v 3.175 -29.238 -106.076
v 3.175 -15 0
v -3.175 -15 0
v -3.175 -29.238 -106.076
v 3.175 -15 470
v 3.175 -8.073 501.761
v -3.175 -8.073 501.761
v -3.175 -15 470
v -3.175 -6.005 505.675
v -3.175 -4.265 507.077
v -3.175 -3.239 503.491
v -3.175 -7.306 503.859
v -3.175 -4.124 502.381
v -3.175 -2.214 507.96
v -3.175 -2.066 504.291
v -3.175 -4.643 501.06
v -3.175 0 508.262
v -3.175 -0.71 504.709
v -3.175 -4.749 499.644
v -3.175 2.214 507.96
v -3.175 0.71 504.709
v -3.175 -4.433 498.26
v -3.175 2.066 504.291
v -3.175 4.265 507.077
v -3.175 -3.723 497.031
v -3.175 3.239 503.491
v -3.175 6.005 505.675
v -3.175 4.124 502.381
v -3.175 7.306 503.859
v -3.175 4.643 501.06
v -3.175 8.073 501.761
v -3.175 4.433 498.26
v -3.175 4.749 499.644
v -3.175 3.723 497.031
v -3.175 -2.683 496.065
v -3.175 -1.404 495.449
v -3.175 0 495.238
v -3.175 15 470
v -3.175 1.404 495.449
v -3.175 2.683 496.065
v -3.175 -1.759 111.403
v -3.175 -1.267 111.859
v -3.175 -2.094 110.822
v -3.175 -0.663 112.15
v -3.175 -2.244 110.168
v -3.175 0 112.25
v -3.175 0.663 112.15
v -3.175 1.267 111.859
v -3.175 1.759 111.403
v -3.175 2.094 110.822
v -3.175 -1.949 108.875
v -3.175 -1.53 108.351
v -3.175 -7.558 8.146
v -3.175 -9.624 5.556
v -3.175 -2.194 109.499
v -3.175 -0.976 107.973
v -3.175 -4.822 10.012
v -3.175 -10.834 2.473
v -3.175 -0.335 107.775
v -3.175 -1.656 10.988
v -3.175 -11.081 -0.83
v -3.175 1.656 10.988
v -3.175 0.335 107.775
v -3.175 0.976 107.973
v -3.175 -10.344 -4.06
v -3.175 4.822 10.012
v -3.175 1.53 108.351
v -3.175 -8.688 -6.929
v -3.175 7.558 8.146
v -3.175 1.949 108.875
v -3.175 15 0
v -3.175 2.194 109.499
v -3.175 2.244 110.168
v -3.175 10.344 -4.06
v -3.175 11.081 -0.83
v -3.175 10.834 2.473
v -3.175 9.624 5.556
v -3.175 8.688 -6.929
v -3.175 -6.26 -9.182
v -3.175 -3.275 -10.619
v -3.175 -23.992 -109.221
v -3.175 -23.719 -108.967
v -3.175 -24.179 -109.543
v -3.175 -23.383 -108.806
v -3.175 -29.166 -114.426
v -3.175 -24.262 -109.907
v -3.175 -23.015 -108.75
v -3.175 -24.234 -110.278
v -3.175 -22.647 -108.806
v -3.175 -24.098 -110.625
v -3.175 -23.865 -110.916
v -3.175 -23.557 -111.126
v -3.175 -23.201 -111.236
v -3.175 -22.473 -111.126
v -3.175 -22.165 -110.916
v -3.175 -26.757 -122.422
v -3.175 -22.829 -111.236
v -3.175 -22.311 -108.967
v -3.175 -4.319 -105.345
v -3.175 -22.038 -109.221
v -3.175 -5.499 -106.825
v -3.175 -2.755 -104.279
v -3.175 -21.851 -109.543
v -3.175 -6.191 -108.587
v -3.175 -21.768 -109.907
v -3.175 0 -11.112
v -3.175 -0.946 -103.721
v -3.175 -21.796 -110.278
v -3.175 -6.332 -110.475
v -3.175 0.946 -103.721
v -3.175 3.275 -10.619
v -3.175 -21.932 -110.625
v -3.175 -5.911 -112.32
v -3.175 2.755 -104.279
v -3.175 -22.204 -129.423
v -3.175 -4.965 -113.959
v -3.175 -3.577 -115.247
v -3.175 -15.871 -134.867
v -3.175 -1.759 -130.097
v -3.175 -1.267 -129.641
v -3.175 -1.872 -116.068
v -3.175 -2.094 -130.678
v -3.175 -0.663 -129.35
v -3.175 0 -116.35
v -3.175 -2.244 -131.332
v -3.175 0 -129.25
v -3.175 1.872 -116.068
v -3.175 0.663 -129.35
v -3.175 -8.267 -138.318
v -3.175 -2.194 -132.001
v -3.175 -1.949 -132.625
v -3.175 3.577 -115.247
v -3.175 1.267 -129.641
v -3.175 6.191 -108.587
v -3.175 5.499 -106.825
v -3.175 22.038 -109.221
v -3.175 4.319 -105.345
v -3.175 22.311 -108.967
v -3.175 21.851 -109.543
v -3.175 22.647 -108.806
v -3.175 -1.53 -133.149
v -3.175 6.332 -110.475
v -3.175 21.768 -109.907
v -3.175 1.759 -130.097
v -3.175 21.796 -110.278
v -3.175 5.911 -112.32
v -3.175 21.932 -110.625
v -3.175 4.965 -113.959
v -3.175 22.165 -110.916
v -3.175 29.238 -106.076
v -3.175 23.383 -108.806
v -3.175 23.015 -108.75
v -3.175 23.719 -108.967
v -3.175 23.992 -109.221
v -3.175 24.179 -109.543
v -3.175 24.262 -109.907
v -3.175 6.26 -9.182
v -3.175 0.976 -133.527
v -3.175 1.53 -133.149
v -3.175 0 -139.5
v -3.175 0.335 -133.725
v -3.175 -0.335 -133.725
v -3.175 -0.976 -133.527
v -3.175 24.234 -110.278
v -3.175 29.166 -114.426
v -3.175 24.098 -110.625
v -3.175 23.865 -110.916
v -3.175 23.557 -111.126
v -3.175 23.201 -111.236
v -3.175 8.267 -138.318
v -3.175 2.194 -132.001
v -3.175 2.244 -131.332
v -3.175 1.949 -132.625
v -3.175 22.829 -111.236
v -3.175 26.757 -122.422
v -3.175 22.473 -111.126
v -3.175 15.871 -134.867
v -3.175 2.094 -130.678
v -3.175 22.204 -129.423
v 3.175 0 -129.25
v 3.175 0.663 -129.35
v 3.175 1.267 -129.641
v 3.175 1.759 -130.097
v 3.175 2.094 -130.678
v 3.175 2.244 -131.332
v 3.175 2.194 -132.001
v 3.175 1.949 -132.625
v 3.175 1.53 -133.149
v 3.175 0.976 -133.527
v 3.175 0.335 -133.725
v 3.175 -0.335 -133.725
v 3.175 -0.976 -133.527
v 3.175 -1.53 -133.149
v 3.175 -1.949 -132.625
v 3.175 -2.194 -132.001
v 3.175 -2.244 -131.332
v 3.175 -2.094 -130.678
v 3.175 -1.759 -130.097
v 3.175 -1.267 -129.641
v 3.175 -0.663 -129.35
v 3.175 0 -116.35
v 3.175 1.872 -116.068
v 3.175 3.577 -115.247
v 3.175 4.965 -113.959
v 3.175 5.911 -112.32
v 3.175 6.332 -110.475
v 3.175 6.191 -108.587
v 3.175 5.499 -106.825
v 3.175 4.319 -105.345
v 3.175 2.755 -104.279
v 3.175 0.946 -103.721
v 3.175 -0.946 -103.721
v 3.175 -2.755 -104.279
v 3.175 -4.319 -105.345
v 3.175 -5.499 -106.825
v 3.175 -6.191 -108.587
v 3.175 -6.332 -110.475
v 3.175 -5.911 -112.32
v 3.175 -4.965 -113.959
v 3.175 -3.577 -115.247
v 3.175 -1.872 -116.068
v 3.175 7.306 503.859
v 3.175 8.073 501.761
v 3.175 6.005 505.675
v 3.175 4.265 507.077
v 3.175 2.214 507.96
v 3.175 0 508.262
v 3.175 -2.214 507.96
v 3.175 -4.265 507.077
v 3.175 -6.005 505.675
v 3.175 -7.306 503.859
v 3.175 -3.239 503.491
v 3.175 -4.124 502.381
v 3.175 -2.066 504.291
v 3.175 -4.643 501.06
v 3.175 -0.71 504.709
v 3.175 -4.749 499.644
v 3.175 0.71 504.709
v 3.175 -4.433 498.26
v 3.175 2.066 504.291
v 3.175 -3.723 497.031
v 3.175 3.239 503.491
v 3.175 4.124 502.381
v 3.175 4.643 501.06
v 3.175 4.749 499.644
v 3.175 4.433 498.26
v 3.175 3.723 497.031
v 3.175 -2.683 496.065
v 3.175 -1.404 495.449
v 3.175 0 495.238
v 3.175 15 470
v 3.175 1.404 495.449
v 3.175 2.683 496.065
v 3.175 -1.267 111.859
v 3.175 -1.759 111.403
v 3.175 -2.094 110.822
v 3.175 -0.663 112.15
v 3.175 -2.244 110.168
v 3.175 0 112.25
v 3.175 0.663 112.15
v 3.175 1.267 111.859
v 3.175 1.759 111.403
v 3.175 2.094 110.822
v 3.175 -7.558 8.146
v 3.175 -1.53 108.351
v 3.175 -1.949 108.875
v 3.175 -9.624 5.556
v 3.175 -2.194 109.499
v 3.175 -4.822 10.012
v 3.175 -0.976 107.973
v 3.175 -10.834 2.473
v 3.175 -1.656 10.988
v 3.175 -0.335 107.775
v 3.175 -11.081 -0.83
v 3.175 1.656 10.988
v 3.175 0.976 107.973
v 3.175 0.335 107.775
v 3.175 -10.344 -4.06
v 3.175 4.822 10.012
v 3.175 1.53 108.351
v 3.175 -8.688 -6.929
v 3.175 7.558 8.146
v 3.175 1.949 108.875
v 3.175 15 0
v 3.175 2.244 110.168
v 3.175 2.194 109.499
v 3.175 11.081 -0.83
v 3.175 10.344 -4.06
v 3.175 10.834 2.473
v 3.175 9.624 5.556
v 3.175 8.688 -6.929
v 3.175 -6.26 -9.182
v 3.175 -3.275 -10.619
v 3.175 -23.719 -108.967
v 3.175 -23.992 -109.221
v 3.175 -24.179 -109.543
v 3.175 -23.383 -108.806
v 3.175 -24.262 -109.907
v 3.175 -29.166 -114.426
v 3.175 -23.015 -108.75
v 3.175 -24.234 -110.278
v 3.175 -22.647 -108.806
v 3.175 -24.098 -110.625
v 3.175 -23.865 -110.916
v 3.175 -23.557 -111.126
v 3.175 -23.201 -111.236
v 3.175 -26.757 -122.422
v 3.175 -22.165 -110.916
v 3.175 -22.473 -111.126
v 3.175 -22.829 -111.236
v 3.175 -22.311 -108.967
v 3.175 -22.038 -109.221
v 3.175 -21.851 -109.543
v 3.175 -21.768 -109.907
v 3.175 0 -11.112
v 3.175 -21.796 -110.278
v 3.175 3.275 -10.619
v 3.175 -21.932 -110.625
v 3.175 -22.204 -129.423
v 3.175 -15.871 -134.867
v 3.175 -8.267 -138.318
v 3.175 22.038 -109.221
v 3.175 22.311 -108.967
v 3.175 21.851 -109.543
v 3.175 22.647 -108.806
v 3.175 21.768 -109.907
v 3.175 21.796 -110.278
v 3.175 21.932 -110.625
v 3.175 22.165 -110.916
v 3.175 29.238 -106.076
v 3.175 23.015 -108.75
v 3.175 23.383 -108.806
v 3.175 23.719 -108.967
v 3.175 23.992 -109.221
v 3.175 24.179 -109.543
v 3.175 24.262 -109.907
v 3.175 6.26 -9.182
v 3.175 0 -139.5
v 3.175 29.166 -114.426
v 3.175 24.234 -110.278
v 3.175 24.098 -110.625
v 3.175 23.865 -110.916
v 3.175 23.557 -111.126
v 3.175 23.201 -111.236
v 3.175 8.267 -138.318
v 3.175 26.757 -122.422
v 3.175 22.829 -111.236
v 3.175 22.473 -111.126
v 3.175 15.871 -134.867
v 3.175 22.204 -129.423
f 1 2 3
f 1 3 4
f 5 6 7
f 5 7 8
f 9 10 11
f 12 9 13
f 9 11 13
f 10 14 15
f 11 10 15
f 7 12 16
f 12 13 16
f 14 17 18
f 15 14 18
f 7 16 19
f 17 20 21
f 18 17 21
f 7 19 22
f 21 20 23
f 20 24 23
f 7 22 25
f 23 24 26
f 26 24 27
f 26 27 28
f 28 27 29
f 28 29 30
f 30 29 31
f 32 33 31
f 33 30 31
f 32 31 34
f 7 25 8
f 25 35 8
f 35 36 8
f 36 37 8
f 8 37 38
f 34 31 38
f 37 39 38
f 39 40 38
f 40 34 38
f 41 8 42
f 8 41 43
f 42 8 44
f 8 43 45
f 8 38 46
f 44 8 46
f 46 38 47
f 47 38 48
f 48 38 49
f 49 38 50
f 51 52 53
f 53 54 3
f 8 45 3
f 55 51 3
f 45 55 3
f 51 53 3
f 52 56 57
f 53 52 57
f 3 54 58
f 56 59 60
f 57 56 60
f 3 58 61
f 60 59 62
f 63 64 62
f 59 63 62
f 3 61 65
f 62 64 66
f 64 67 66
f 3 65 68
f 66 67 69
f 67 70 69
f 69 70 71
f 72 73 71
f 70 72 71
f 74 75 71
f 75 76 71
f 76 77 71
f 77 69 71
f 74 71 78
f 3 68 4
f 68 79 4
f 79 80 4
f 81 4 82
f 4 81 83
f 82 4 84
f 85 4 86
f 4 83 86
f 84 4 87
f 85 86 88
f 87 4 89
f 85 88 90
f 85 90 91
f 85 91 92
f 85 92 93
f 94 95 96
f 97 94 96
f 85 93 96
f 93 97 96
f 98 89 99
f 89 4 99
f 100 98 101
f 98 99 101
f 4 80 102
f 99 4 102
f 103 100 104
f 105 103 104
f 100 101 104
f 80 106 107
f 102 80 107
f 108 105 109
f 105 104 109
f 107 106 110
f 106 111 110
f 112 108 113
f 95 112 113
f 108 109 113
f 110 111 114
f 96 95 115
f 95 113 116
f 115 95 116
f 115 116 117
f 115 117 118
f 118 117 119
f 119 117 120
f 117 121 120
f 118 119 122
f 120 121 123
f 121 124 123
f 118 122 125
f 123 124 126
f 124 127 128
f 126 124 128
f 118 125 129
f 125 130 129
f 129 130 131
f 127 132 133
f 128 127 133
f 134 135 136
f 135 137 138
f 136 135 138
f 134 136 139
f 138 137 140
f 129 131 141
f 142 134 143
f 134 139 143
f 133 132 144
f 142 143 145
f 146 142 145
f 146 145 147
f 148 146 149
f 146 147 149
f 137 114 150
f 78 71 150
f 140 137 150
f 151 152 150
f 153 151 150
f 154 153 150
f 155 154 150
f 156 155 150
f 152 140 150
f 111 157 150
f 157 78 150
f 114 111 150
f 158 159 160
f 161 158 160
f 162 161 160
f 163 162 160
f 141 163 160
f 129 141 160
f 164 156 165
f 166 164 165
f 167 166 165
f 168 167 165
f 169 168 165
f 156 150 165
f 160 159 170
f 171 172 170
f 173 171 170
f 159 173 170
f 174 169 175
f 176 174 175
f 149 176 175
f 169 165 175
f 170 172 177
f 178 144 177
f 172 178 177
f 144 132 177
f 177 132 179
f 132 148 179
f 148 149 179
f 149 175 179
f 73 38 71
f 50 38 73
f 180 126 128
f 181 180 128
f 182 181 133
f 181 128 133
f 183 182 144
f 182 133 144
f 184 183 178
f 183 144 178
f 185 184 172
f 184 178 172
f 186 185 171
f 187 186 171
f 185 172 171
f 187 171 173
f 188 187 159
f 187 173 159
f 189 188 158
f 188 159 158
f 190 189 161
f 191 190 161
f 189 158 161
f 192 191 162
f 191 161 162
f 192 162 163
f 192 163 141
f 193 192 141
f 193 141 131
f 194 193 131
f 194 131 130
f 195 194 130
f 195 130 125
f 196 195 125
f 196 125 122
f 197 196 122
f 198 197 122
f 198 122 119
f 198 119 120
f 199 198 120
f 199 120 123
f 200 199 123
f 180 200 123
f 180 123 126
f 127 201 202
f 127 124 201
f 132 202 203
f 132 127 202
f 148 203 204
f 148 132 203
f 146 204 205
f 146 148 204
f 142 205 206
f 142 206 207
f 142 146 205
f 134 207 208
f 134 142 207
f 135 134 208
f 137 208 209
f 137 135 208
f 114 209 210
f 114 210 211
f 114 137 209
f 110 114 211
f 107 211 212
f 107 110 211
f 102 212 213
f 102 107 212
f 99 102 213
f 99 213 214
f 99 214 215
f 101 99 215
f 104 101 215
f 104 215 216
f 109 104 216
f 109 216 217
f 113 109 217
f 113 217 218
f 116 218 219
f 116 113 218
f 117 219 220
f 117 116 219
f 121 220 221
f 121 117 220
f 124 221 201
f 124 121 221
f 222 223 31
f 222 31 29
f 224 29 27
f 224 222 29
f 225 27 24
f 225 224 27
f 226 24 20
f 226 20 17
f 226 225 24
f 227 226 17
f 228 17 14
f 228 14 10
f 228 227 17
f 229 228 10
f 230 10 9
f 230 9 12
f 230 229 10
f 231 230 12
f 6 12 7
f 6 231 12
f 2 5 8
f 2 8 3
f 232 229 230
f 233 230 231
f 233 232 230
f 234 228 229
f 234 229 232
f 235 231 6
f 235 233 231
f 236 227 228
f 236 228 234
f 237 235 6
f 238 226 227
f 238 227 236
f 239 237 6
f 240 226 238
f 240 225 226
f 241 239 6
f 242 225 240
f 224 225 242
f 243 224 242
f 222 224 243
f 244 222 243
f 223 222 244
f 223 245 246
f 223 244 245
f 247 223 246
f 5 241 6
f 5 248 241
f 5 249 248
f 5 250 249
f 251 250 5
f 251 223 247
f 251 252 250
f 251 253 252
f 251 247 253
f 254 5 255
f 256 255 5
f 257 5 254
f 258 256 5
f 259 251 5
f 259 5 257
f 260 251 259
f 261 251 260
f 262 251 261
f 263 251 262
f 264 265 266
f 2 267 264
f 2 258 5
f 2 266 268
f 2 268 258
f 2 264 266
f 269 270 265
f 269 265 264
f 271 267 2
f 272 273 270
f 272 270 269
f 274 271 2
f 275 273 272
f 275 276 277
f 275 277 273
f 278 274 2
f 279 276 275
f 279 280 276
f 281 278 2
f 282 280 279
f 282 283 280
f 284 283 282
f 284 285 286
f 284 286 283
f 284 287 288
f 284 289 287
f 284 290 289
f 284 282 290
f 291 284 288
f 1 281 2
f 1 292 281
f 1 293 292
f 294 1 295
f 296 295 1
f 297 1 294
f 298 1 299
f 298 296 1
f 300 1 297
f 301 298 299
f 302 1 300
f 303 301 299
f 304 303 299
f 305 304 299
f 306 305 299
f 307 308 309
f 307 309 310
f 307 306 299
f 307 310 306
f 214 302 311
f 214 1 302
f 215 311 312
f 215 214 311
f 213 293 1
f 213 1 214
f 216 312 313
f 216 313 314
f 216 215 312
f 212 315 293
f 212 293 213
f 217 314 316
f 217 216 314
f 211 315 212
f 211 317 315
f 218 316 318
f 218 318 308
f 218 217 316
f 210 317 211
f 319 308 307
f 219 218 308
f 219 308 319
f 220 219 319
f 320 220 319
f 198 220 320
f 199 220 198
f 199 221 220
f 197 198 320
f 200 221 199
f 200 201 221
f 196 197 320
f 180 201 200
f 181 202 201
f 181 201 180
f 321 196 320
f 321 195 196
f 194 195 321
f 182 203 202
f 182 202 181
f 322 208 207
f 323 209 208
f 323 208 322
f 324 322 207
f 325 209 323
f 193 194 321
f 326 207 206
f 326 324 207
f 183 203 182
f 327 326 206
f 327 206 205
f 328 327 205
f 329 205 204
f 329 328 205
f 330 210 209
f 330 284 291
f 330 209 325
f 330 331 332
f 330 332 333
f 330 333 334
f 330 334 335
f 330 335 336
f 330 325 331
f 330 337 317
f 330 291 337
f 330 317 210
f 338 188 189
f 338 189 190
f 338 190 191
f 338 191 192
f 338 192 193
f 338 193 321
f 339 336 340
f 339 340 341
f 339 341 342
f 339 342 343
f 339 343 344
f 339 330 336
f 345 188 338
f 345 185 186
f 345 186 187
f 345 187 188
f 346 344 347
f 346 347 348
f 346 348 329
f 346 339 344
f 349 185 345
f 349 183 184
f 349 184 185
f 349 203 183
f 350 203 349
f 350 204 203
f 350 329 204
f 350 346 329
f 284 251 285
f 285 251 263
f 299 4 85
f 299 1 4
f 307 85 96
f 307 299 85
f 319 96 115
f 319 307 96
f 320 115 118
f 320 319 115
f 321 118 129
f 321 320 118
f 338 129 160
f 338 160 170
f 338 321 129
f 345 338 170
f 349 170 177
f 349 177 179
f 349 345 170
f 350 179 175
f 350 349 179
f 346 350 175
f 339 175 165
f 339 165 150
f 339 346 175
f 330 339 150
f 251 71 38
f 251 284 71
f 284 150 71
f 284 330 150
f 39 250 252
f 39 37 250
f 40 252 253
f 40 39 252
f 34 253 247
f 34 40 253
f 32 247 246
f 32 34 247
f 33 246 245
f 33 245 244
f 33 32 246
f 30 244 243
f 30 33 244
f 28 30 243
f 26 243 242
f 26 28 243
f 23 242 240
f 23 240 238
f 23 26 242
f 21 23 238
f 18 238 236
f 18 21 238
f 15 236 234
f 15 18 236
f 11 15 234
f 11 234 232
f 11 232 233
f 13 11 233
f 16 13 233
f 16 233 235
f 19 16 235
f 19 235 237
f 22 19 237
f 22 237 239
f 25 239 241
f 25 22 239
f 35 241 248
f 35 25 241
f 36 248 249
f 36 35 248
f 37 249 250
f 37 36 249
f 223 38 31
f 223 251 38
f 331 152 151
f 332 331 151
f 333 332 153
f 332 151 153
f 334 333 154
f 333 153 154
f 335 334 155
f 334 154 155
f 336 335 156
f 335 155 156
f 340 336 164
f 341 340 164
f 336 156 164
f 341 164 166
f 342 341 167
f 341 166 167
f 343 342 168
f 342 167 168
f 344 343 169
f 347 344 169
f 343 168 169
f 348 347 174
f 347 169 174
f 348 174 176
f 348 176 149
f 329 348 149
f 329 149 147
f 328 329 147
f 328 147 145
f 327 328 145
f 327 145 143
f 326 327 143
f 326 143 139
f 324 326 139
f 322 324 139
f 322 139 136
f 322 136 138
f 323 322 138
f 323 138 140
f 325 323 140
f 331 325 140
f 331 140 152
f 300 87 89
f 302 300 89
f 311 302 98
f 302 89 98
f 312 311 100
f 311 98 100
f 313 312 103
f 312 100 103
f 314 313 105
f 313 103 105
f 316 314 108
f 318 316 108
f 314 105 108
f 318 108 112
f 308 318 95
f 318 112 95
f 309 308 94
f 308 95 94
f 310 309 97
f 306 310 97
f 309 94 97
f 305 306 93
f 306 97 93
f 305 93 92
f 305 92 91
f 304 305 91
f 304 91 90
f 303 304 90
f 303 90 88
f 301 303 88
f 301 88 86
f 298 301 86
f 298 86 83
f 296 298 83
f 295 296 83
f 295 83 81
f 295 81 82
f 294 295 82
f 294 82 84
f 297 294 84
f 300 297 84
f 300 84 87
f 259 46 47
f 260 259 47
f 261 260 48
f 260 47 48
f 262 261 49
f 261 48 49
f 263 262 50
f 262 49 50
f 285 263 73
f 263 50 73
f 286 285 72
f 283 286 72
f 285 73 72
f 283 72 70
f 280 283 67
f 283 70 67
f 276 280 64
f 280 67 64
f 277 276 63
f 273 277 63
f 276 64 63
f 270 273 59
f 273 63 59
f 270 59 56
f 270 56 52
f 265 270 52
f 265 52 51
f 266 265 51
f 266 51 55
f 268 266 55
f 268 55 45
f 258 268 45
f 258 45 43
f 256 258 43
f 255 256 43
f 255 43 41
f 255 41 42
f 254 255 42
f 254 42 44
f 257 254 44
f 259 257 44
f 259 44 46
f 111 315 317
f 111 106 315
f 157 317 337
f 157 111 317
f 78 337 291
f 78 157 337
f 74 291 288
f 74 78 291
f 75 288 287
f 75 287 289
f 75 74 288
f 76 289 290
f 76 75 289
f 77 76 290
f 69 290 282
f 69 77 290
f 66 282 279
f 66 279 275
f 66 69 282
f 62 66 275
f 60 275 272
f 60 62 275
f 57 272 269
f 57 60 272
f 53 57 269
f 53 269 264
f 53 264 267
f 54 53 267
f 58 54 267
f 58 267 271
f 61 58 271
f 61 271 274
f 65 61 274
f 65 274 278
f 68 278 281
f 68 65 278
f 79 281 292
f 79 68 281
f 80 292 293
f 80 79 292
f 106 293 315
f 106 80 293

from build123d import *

# Parameters (mm, degrees)
SKETCH1_R             = 6.35
SKETCH1_R_2           = 11.1125
SKETCH1_R_3           = 4.7625
BOSS_EXTRUDE1_DEPTH   = 3.175
M3X0_5_TAPPED_HOLE1_D = 2.5
M4_CLEARANCE_HOLE1_D  = 4.5


with BuildPart() as part:
    # Sketch1 → Boss-Extrude1 (new, symmetric)
    with BuildSketch(Plane(origin=(0, 0, 0), x_dir=(0, 0, -1), z_dir=(1, 0, 0))):
        with BuildLine():
            Line((-470, 15), (-501.760727799, 8.072716015))
            ThreePointArc((-501.760727799, 8.072716015), (-508.2625, 0), (-501.760727799, -8.072716015))
            Line((-501.760727799, -8.072716015), (-470, -15))
            Line((-470, -15), (0, -15))
            Line((0, -15), (106.075609583, -29.237803609))
            ThreePointArc((106.075609583, -29.237803609), (139.5, 0), (106.075609583, 29.237803609))
            Line((106.075609583, 29.237803609), (0, 15))
            Line((0, 15), (-470, 15))
        make_face()
        with Locations((110, 0)):
            Circle(SKETCH1_R, mode=Mode.SUBTRACT)
        Circle(SKETCH1_R_2, mode=Mode.SUBTRACT)
        with Locations((-500, 0)):
            Circle(SKETCH1_R_3, mode=Mode.SUBTRACT)
    extrude(amount=BOSS_EXTRUDE1_DEPTH, both=True)

    # M3x0.5 Tapped Hole1 (through all)
    with Locations(Plane(origin=(3.175, 0, 0), x_dir=(0, 0, -1), z_dir=(1, 0, 0))):
        with Locations((110, 23.015), (110, 0), (110, -23.015)):
            Hole(M3X0_5_TAPPED_HOLE1_D / 2)

    # M4 Clearance Hole1 (through all)
    with Locations(Plane(origin=(3.175, 0, 0), x_dir=(0, 0, -1), z_dir=(1, 0, 0))):
        with Locations((131.5, 0), (-110, 0)):
            Hole(M4_CLEARANCE_HOLE1_D / 2)


solid = part.part
